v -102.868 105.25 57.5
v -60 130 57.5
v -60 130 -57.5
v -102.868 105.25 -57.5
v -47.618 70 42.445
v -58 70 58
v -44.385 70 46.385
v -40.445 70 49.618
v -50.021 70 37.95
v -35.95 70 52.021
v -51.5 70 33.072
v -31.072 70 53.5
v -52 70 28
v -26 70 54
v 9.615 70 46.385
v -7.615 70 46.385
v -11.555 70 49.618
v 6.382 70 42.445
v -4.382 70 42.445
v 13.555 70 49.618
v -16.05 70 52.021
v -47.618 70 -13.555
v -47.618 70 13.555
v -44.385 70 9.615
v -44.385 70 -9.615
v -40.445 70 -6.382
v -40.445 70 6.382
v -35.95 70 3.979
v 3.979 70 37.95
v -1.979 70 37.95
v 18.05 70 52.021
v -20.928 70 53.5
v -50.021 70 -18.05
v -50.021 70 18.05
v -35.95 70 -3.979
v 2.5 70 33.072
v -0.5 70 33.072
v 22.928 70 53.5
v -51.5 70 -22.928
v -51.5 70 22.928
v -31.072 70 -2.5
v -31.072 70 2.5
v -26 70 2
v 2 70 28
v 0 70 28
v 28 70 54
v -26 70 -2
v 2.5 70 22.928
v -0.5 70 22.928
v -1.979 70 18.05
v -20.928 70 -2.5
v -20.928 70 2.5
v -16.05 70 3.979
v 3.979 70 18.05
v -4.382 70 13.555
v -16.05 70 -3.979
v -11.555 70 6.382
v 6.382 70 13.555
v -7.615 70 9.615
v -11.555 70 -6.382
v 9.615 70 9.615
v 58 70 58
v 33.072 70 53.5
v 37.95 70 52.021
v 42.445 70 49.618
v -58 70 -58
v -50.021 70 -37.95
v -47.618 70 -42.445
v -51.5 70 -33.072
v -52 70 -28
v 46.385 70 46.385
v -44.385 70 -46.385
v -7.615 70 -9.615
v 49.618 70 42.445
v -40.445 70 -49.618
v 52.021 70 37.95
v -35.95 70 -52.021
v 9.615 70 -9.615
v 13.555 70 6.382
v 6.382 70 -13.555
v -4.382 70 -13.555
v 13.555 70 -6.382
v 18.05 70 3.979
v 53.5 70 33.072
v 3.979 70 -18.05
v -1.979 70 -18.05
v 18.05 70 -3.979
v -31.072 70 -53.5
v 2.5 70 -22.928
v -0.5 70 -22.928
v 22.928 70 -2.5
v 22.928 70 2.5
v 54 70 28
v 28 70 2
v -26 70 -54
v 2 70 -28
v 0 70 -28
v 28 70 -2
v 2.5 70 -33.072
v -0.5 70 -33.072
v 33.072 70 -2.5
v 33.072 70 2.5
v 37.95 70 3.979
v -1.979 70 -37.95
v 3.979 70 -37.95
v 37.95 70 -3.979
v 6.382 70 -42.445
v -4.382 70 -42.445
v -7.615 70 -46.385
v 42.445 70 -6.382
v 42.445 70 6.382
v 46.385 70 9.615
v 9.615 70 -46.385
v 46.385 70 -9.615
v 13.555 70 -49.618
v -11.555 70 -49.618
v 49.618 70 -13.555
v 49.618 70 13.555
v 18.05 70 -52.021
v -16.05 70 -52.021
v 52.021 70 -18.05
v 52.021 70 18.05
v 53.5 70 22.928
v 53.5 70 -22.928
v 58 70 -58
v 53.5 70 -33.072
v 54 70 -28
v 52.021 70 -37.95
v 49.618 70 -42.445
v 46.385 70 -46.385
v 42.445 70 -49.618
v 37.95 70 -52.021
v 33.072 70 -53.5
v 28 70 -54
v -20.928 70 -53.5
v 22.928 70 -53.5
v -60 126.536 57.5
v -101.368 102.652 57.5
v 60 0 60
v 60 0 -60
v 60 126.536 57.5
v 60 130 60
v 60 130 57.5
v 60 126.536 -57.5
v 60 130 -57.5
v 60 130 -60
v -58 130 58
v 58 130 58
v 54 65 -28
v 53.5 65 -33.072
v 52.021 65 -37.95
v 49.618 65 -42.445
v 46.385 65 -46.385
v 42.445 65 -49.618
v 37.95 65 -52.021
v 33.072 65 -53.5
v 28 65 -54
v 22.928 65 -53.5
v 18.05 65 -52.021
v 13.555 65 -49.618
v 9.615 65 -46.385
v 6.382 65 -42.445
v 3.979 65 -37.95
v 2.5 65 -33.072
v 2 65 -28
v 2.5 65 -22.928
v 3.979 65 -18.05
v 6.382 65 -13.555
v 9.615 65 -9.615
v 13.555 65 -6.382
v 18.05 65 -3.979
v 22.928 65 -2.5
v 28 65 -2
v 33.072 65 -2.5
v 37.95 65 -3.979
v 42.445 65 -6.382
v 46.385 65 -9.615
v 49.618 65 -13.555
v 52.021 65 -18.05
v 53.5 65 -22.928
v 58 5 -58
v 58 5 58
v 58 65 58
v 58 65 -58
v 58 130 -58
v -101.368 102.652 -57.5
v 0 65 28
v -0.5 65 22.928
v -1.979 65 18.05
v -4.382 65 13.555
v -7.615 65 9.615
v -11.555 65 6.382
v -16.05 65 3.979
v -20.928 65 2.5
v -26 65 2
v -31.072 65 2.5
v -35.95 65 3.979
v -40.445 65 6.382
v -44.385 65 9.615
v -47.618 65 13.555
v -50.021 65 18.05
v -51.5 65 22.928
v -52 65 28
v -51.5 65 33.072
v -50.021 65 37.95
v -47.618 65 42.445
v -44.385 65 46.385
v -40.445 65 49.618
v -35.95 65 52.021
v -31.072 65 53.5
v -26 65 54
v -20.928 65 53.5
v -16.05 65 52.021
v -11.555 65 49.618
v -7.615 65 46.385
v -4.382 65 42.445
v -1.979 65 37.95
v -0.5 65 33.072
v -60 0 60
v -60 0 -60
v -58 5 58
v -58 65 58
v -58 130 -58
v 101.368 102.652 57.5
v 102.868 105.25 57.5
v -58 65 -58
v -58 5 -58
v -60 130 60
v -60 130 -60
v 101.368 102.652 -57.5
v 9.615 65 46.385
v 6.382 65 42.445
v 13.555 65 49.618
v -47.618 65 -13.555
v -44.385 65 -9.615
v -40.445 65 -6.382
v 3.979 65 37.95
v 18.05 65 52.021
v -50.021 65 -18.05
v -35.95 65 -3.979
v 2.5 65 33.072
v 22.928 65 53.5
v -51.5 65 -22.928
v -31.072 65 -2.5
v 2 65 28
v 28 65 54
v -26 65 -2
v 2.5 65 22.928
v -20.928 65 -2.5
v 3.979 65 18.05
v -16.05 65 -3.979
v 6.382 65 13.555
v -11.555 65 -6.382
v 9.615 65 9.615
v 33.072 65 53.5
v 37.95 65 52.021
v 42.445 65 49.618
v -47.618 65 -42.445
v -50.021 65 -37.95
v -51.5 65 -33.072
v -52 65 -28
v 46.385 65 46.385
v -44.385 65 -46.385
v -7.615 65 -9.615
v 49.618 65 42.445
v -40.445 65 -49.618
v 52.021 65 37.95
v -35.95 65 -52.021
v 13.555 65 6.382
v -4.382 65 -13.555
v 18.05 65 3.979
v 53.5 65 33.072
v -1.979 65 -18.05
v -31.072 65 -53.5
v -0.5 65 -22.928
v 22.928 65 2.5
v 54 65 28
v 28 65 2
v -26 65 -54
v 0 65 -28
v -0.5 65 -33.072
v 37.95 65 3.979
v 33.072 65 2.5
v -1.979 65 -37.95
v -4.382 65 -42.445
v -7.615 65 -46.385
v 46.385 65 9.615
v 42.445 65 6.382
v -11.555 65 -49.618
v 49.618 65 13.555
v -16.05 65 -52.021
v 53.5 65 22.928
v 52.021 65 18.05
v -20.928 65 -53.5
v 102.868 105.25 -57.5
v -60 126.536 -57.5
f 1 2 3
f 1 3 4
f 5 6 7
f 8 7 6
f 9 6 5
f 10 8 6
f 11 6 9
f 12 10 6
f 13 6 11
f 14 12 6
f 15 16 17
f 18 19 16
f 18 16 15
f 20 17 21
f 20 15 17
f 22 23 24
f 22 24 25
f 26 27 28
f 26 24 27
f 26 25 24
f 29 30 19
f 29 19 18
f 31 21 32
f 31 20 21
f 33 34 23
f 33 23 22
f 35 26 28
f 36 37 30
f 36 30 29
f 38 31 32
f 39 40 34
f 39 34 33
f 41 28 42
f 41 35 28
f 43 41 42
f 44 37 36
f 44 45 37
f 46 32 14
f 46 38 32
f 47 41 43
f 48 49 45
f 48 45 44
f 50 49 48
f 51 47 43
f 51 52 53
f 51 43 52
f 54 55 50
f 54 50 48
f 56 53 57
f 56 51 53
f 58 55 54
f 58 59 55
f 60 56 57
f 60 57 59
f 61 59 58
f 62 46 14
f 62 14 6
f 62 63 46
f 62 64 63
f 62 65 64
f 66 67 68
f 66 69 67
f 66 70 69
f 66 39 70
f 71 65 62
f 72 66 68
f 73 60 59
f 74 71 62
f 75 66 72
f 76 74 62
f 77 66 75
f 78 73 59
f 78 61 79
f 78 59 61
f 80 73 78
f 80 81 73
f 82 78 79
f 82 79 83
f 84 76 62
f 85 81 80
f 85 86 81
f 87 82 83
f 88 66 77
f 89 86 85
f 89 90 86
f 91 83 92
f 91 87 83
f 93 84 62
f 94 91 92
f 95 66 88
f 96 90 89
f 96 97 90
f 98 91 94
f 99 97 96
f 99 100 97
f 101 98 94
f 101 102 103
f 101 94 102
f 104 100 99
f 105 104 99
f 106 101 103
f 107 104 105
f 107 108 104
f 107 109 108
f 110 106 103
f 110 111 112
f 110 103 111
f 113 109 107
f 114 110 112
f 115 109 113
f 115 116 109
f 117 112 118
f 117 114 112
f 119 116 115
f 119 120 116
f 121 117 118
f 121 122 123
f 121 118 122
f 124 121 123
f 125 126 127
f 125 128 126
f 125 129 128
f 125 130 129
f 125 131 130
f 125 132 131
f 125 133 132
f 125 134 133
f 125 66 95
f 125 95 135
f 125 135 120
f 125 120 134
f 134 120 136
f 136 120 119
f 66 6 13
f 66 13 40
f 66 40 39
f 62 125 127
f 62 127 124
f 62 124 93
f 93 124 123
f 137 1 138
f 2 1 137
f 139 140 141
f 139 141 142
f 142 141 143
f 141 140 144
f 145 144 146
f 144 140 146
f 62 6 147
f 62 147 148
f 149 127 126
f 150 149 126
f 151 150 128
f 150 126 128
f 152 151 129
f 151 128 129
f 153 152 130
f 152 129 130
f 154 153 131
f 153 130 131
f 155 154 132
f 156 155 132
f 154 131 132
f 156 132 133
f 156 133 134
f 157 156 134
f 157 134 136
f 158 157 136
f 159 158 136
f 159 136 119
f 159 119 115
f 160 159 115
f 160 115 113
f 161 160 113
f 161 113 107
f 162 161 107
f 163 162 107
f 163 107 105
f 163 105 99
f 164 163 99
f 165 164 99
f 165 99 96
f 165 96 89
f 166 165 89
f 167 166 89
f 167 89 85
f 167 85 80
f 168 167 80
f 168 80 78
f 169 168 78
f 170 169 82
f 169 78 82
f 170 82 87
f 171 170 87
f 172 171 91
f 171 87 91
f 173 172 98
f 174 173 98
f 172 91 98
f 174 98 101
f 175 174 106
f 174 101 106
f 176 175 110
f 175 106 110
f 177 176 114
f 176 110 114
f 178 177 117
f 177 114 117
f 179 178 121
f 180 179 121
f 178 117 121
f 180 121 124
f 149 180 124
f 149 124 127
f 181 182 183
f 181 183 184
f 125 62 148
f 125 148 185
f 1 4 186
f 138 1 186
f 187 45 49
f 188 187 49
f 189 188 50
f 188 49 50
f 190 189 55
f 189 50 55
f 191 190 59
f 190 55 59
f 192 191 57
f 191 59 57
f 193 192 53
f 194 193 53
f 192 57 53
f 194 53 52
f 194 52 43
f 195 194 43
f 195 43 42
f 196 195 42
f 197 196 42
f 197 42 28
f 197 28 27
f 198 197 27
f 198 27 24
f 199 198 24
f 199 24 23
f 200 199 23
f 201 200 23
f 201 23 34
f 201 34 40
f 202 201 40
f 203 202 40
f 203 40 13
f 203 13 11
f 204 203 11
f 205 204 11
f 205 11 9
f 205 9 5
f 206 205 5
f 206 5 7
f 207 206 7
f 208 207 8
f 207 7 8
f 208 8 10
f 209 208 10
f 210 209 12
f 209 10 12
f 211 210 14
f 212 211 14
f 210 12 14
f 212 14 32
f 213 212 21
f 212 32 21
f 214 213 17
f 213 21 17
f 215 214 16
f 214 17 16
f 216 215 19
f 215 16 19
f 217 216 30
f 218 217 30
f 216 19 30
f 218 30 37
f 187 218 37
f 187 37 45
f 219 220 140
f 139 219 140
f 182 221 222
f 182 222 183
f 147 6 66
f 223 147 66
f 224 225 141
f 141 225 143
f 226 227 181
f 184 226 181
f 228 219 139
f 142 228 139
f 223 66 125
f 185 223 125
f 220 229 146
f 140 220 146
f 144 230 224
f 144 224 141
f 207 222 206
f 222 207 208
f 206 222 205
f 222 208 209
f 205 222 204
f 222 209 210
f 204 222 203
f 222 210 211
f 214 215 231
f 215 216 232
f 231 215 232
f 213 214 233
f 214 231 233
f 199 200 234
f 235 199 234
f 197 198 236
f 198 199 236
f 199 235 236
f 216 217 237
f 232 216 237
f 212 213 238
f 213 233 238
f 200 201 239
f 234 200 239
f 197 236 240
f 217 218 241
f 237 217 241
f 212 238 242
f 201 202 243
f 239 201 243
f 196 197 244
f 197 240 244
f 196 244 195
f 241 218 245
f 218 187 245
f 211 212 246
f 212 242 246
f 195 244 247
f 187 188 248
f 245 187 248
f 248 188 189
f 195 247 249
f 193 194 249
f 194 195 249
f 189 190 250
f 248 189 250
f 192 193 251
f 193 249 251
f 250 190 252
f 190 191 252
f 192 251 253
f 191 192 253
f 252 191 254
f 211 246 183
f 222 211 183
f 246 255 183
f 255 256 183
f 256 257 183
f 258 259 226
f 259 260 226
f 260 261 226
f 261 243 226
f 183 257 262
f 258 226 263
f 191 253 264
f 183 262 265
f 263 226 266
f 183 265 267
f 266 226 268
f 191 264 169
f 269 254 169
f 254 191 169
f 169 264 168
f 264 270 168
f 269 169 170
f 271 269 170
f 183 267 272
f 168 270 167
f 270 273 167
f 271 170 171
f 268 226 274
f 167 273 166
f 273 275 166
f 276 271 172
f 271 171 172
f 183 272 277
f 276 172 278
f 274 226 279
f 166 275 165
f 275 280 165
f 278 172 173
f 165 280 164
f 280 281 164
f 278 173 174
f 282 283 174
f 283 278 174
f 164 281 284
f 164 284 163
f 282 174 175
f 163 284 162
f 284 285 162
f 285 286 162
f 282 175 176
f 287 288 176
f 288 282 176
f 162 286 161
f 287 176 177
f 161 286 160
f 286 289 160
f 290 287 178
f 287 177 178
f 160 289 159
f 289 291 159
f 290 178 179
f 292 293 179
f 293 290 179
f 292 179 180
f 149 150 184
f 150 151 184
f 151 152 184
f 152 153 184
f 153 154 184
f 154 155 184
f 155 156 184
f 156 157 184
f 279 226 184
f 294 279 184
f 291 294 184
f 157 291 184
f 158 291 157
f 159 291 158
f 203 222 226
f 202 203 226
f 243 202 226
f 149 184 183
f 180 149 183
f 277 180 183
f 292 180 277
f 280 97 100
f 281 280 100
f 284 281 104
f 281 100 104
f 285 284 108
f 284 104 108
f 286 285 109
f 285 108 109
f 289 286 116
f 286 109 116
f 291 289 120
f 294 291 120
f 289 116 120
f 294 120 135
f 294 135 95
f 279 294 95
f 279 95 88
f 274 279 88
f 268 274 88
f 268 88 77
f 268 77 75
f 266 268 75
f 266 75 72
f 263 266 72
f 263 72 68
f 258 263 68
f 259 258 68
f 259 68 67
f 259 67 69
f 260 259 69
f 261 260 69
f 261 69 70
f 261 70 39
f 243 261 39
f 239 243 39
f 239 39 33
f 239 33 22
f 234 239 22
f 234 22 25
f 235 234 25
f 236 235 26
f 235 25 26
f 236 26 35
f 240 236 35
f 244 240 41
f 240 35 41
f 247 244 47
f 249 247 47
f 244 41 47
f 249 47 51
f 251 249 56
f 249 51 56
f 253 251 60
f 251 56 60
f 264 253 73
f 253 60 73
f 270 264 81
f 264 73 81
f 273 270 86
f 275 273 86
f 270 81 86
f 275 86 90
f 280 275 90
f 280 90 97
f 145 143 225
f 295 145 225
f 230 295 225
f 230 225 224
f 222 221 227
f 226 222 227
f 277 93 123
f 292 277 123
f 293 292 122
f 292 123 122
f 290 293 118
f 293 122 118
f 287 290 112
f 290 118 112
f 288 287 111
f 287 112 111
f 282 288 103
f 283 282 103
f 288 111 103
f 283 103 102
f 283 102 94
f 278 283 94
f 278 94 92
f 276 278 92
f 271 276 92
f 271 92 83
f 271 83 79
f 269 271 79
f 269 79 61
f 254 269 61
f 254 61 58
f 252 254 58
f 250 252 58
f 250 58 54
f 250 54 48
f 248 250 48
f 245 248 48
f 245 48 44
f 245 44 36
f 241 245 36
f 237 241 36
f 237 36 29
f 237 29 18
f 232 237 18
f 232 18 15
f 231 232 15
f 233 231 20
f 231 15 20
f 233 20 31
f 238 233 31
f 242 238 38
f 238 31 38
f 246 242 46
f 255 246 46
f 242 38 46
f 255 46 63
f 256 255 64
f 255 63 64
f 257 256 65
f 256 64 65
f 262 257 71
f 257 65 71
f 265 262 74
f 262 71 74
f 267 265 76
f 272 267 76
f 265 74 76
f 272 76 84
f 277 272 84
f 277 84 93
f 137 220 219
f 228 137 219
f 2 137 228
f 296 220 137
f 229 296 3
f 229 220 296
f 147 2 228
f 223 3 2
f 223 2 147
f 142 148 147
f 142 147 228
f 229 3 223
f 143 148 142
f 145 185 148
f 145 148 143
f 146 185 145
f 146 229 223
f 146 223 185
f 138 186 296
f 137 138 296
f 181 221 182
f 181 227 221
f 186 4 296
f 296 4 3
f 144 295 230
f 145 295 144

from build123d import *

# Parameters (mm, degrees)
SKETCH1_W           = 120
SKETCH1_H           = 120
BOSS_EXTRUDE1_DEPTH = 5
SKETCH1_3_W         = 120
SKETCH1_3_H         = 120
SKETCH1_3_W_2       = 116
SKETCH1_3_H_2       = 116
BOSS_EXTRUDE2_DEPTH = 130
BOSS_EXTRUDE3_DEPTH = 57.5
SKETCH4_W           = 120
SKETCH4_H           = 5
BOSS_EXTRUDE4_DEPTH = 118
SKETCH5_R           = 26
CUT_EXTRUDE1_DEPTH  = 10


with BuildPart() as part:
    # Sketch1 → Boss-Extrude1 (new body)
    with BuildSketch(Plane(origin=(0, 0, 0), x_dir=(1, 0, 0), z_dir=(0, 1, 0))):
        Rectangle(SKETCH1_W, SKETCH1_H)
    extrude(amount=BOSS_EXTRUDE1_DEPTH)

    # Sketch1<3> → Boss-Extrude2 (add)
    with BuildSketch(Plane(origin=(0, 0, 0), x_dir=(1, 0, 0), z_dir=(0, 1, 0))):
        Rectangle(SKETCH1_3_W, SKETCH1_3_H)
        Rectangle(SKETCH1_3_W_2, SKETCH1_3_H_2, mode=Mode.SUBTRACT)
    extrude(amount=BOSS_EXTRUDE2_DEPTH)

    # Sketch2 → Boss-Extrude3 (add, symmetric)
    with BuildSketch(Plane.XY):
        Polygon((60, 130), (102.868257487, 105.25), (101.368257487, 102.651923789), (60, 126.535898385), align=None)
    boss_extrude3 = extrude(amount=BOSS_EXTRUDE3_DEPTH, both=True)

    # Mirror1: Boss-Extrude3 across plane
    add(boss_extrude3.mirror(Plane(origin=(0, 0, 0), x_dir=(0, 0, 1), z_dir=(1, 0, 0))))

    # Sketch4 → Boss-Extrude4 (add)
    with BuildSketch(Plane.XY.offset(-58)):
        with Locations((0, 67.5)):
            Rectangle(SKETCH4_W, SKETCH4_H)
    extrude(amount=BOSS_EXTRUDE4_DEPTH)

    # Sketch5 → Cut-Extrude1 (cut)
    with BuildSketch(Plane(origin=(0, 70, 0), x_dir=(1, 0, 0), z_dir=(0, 1, 0))):
        with Locations((28, 28)):
            Circle(SKETCH5_R)
        with Locations((-26, 28)):
            Circle(SKETCH5_R)
        with Locations((28, -28)):
            Circle(SKETCH5_R)
        with Locations((-26, -28)):
            Circle(SKETCH5_R)
    extrude(amount=-CUT_EXTRUDE1_DEPTH, mode=Mode.SUBTRACT)


solid = part.part
